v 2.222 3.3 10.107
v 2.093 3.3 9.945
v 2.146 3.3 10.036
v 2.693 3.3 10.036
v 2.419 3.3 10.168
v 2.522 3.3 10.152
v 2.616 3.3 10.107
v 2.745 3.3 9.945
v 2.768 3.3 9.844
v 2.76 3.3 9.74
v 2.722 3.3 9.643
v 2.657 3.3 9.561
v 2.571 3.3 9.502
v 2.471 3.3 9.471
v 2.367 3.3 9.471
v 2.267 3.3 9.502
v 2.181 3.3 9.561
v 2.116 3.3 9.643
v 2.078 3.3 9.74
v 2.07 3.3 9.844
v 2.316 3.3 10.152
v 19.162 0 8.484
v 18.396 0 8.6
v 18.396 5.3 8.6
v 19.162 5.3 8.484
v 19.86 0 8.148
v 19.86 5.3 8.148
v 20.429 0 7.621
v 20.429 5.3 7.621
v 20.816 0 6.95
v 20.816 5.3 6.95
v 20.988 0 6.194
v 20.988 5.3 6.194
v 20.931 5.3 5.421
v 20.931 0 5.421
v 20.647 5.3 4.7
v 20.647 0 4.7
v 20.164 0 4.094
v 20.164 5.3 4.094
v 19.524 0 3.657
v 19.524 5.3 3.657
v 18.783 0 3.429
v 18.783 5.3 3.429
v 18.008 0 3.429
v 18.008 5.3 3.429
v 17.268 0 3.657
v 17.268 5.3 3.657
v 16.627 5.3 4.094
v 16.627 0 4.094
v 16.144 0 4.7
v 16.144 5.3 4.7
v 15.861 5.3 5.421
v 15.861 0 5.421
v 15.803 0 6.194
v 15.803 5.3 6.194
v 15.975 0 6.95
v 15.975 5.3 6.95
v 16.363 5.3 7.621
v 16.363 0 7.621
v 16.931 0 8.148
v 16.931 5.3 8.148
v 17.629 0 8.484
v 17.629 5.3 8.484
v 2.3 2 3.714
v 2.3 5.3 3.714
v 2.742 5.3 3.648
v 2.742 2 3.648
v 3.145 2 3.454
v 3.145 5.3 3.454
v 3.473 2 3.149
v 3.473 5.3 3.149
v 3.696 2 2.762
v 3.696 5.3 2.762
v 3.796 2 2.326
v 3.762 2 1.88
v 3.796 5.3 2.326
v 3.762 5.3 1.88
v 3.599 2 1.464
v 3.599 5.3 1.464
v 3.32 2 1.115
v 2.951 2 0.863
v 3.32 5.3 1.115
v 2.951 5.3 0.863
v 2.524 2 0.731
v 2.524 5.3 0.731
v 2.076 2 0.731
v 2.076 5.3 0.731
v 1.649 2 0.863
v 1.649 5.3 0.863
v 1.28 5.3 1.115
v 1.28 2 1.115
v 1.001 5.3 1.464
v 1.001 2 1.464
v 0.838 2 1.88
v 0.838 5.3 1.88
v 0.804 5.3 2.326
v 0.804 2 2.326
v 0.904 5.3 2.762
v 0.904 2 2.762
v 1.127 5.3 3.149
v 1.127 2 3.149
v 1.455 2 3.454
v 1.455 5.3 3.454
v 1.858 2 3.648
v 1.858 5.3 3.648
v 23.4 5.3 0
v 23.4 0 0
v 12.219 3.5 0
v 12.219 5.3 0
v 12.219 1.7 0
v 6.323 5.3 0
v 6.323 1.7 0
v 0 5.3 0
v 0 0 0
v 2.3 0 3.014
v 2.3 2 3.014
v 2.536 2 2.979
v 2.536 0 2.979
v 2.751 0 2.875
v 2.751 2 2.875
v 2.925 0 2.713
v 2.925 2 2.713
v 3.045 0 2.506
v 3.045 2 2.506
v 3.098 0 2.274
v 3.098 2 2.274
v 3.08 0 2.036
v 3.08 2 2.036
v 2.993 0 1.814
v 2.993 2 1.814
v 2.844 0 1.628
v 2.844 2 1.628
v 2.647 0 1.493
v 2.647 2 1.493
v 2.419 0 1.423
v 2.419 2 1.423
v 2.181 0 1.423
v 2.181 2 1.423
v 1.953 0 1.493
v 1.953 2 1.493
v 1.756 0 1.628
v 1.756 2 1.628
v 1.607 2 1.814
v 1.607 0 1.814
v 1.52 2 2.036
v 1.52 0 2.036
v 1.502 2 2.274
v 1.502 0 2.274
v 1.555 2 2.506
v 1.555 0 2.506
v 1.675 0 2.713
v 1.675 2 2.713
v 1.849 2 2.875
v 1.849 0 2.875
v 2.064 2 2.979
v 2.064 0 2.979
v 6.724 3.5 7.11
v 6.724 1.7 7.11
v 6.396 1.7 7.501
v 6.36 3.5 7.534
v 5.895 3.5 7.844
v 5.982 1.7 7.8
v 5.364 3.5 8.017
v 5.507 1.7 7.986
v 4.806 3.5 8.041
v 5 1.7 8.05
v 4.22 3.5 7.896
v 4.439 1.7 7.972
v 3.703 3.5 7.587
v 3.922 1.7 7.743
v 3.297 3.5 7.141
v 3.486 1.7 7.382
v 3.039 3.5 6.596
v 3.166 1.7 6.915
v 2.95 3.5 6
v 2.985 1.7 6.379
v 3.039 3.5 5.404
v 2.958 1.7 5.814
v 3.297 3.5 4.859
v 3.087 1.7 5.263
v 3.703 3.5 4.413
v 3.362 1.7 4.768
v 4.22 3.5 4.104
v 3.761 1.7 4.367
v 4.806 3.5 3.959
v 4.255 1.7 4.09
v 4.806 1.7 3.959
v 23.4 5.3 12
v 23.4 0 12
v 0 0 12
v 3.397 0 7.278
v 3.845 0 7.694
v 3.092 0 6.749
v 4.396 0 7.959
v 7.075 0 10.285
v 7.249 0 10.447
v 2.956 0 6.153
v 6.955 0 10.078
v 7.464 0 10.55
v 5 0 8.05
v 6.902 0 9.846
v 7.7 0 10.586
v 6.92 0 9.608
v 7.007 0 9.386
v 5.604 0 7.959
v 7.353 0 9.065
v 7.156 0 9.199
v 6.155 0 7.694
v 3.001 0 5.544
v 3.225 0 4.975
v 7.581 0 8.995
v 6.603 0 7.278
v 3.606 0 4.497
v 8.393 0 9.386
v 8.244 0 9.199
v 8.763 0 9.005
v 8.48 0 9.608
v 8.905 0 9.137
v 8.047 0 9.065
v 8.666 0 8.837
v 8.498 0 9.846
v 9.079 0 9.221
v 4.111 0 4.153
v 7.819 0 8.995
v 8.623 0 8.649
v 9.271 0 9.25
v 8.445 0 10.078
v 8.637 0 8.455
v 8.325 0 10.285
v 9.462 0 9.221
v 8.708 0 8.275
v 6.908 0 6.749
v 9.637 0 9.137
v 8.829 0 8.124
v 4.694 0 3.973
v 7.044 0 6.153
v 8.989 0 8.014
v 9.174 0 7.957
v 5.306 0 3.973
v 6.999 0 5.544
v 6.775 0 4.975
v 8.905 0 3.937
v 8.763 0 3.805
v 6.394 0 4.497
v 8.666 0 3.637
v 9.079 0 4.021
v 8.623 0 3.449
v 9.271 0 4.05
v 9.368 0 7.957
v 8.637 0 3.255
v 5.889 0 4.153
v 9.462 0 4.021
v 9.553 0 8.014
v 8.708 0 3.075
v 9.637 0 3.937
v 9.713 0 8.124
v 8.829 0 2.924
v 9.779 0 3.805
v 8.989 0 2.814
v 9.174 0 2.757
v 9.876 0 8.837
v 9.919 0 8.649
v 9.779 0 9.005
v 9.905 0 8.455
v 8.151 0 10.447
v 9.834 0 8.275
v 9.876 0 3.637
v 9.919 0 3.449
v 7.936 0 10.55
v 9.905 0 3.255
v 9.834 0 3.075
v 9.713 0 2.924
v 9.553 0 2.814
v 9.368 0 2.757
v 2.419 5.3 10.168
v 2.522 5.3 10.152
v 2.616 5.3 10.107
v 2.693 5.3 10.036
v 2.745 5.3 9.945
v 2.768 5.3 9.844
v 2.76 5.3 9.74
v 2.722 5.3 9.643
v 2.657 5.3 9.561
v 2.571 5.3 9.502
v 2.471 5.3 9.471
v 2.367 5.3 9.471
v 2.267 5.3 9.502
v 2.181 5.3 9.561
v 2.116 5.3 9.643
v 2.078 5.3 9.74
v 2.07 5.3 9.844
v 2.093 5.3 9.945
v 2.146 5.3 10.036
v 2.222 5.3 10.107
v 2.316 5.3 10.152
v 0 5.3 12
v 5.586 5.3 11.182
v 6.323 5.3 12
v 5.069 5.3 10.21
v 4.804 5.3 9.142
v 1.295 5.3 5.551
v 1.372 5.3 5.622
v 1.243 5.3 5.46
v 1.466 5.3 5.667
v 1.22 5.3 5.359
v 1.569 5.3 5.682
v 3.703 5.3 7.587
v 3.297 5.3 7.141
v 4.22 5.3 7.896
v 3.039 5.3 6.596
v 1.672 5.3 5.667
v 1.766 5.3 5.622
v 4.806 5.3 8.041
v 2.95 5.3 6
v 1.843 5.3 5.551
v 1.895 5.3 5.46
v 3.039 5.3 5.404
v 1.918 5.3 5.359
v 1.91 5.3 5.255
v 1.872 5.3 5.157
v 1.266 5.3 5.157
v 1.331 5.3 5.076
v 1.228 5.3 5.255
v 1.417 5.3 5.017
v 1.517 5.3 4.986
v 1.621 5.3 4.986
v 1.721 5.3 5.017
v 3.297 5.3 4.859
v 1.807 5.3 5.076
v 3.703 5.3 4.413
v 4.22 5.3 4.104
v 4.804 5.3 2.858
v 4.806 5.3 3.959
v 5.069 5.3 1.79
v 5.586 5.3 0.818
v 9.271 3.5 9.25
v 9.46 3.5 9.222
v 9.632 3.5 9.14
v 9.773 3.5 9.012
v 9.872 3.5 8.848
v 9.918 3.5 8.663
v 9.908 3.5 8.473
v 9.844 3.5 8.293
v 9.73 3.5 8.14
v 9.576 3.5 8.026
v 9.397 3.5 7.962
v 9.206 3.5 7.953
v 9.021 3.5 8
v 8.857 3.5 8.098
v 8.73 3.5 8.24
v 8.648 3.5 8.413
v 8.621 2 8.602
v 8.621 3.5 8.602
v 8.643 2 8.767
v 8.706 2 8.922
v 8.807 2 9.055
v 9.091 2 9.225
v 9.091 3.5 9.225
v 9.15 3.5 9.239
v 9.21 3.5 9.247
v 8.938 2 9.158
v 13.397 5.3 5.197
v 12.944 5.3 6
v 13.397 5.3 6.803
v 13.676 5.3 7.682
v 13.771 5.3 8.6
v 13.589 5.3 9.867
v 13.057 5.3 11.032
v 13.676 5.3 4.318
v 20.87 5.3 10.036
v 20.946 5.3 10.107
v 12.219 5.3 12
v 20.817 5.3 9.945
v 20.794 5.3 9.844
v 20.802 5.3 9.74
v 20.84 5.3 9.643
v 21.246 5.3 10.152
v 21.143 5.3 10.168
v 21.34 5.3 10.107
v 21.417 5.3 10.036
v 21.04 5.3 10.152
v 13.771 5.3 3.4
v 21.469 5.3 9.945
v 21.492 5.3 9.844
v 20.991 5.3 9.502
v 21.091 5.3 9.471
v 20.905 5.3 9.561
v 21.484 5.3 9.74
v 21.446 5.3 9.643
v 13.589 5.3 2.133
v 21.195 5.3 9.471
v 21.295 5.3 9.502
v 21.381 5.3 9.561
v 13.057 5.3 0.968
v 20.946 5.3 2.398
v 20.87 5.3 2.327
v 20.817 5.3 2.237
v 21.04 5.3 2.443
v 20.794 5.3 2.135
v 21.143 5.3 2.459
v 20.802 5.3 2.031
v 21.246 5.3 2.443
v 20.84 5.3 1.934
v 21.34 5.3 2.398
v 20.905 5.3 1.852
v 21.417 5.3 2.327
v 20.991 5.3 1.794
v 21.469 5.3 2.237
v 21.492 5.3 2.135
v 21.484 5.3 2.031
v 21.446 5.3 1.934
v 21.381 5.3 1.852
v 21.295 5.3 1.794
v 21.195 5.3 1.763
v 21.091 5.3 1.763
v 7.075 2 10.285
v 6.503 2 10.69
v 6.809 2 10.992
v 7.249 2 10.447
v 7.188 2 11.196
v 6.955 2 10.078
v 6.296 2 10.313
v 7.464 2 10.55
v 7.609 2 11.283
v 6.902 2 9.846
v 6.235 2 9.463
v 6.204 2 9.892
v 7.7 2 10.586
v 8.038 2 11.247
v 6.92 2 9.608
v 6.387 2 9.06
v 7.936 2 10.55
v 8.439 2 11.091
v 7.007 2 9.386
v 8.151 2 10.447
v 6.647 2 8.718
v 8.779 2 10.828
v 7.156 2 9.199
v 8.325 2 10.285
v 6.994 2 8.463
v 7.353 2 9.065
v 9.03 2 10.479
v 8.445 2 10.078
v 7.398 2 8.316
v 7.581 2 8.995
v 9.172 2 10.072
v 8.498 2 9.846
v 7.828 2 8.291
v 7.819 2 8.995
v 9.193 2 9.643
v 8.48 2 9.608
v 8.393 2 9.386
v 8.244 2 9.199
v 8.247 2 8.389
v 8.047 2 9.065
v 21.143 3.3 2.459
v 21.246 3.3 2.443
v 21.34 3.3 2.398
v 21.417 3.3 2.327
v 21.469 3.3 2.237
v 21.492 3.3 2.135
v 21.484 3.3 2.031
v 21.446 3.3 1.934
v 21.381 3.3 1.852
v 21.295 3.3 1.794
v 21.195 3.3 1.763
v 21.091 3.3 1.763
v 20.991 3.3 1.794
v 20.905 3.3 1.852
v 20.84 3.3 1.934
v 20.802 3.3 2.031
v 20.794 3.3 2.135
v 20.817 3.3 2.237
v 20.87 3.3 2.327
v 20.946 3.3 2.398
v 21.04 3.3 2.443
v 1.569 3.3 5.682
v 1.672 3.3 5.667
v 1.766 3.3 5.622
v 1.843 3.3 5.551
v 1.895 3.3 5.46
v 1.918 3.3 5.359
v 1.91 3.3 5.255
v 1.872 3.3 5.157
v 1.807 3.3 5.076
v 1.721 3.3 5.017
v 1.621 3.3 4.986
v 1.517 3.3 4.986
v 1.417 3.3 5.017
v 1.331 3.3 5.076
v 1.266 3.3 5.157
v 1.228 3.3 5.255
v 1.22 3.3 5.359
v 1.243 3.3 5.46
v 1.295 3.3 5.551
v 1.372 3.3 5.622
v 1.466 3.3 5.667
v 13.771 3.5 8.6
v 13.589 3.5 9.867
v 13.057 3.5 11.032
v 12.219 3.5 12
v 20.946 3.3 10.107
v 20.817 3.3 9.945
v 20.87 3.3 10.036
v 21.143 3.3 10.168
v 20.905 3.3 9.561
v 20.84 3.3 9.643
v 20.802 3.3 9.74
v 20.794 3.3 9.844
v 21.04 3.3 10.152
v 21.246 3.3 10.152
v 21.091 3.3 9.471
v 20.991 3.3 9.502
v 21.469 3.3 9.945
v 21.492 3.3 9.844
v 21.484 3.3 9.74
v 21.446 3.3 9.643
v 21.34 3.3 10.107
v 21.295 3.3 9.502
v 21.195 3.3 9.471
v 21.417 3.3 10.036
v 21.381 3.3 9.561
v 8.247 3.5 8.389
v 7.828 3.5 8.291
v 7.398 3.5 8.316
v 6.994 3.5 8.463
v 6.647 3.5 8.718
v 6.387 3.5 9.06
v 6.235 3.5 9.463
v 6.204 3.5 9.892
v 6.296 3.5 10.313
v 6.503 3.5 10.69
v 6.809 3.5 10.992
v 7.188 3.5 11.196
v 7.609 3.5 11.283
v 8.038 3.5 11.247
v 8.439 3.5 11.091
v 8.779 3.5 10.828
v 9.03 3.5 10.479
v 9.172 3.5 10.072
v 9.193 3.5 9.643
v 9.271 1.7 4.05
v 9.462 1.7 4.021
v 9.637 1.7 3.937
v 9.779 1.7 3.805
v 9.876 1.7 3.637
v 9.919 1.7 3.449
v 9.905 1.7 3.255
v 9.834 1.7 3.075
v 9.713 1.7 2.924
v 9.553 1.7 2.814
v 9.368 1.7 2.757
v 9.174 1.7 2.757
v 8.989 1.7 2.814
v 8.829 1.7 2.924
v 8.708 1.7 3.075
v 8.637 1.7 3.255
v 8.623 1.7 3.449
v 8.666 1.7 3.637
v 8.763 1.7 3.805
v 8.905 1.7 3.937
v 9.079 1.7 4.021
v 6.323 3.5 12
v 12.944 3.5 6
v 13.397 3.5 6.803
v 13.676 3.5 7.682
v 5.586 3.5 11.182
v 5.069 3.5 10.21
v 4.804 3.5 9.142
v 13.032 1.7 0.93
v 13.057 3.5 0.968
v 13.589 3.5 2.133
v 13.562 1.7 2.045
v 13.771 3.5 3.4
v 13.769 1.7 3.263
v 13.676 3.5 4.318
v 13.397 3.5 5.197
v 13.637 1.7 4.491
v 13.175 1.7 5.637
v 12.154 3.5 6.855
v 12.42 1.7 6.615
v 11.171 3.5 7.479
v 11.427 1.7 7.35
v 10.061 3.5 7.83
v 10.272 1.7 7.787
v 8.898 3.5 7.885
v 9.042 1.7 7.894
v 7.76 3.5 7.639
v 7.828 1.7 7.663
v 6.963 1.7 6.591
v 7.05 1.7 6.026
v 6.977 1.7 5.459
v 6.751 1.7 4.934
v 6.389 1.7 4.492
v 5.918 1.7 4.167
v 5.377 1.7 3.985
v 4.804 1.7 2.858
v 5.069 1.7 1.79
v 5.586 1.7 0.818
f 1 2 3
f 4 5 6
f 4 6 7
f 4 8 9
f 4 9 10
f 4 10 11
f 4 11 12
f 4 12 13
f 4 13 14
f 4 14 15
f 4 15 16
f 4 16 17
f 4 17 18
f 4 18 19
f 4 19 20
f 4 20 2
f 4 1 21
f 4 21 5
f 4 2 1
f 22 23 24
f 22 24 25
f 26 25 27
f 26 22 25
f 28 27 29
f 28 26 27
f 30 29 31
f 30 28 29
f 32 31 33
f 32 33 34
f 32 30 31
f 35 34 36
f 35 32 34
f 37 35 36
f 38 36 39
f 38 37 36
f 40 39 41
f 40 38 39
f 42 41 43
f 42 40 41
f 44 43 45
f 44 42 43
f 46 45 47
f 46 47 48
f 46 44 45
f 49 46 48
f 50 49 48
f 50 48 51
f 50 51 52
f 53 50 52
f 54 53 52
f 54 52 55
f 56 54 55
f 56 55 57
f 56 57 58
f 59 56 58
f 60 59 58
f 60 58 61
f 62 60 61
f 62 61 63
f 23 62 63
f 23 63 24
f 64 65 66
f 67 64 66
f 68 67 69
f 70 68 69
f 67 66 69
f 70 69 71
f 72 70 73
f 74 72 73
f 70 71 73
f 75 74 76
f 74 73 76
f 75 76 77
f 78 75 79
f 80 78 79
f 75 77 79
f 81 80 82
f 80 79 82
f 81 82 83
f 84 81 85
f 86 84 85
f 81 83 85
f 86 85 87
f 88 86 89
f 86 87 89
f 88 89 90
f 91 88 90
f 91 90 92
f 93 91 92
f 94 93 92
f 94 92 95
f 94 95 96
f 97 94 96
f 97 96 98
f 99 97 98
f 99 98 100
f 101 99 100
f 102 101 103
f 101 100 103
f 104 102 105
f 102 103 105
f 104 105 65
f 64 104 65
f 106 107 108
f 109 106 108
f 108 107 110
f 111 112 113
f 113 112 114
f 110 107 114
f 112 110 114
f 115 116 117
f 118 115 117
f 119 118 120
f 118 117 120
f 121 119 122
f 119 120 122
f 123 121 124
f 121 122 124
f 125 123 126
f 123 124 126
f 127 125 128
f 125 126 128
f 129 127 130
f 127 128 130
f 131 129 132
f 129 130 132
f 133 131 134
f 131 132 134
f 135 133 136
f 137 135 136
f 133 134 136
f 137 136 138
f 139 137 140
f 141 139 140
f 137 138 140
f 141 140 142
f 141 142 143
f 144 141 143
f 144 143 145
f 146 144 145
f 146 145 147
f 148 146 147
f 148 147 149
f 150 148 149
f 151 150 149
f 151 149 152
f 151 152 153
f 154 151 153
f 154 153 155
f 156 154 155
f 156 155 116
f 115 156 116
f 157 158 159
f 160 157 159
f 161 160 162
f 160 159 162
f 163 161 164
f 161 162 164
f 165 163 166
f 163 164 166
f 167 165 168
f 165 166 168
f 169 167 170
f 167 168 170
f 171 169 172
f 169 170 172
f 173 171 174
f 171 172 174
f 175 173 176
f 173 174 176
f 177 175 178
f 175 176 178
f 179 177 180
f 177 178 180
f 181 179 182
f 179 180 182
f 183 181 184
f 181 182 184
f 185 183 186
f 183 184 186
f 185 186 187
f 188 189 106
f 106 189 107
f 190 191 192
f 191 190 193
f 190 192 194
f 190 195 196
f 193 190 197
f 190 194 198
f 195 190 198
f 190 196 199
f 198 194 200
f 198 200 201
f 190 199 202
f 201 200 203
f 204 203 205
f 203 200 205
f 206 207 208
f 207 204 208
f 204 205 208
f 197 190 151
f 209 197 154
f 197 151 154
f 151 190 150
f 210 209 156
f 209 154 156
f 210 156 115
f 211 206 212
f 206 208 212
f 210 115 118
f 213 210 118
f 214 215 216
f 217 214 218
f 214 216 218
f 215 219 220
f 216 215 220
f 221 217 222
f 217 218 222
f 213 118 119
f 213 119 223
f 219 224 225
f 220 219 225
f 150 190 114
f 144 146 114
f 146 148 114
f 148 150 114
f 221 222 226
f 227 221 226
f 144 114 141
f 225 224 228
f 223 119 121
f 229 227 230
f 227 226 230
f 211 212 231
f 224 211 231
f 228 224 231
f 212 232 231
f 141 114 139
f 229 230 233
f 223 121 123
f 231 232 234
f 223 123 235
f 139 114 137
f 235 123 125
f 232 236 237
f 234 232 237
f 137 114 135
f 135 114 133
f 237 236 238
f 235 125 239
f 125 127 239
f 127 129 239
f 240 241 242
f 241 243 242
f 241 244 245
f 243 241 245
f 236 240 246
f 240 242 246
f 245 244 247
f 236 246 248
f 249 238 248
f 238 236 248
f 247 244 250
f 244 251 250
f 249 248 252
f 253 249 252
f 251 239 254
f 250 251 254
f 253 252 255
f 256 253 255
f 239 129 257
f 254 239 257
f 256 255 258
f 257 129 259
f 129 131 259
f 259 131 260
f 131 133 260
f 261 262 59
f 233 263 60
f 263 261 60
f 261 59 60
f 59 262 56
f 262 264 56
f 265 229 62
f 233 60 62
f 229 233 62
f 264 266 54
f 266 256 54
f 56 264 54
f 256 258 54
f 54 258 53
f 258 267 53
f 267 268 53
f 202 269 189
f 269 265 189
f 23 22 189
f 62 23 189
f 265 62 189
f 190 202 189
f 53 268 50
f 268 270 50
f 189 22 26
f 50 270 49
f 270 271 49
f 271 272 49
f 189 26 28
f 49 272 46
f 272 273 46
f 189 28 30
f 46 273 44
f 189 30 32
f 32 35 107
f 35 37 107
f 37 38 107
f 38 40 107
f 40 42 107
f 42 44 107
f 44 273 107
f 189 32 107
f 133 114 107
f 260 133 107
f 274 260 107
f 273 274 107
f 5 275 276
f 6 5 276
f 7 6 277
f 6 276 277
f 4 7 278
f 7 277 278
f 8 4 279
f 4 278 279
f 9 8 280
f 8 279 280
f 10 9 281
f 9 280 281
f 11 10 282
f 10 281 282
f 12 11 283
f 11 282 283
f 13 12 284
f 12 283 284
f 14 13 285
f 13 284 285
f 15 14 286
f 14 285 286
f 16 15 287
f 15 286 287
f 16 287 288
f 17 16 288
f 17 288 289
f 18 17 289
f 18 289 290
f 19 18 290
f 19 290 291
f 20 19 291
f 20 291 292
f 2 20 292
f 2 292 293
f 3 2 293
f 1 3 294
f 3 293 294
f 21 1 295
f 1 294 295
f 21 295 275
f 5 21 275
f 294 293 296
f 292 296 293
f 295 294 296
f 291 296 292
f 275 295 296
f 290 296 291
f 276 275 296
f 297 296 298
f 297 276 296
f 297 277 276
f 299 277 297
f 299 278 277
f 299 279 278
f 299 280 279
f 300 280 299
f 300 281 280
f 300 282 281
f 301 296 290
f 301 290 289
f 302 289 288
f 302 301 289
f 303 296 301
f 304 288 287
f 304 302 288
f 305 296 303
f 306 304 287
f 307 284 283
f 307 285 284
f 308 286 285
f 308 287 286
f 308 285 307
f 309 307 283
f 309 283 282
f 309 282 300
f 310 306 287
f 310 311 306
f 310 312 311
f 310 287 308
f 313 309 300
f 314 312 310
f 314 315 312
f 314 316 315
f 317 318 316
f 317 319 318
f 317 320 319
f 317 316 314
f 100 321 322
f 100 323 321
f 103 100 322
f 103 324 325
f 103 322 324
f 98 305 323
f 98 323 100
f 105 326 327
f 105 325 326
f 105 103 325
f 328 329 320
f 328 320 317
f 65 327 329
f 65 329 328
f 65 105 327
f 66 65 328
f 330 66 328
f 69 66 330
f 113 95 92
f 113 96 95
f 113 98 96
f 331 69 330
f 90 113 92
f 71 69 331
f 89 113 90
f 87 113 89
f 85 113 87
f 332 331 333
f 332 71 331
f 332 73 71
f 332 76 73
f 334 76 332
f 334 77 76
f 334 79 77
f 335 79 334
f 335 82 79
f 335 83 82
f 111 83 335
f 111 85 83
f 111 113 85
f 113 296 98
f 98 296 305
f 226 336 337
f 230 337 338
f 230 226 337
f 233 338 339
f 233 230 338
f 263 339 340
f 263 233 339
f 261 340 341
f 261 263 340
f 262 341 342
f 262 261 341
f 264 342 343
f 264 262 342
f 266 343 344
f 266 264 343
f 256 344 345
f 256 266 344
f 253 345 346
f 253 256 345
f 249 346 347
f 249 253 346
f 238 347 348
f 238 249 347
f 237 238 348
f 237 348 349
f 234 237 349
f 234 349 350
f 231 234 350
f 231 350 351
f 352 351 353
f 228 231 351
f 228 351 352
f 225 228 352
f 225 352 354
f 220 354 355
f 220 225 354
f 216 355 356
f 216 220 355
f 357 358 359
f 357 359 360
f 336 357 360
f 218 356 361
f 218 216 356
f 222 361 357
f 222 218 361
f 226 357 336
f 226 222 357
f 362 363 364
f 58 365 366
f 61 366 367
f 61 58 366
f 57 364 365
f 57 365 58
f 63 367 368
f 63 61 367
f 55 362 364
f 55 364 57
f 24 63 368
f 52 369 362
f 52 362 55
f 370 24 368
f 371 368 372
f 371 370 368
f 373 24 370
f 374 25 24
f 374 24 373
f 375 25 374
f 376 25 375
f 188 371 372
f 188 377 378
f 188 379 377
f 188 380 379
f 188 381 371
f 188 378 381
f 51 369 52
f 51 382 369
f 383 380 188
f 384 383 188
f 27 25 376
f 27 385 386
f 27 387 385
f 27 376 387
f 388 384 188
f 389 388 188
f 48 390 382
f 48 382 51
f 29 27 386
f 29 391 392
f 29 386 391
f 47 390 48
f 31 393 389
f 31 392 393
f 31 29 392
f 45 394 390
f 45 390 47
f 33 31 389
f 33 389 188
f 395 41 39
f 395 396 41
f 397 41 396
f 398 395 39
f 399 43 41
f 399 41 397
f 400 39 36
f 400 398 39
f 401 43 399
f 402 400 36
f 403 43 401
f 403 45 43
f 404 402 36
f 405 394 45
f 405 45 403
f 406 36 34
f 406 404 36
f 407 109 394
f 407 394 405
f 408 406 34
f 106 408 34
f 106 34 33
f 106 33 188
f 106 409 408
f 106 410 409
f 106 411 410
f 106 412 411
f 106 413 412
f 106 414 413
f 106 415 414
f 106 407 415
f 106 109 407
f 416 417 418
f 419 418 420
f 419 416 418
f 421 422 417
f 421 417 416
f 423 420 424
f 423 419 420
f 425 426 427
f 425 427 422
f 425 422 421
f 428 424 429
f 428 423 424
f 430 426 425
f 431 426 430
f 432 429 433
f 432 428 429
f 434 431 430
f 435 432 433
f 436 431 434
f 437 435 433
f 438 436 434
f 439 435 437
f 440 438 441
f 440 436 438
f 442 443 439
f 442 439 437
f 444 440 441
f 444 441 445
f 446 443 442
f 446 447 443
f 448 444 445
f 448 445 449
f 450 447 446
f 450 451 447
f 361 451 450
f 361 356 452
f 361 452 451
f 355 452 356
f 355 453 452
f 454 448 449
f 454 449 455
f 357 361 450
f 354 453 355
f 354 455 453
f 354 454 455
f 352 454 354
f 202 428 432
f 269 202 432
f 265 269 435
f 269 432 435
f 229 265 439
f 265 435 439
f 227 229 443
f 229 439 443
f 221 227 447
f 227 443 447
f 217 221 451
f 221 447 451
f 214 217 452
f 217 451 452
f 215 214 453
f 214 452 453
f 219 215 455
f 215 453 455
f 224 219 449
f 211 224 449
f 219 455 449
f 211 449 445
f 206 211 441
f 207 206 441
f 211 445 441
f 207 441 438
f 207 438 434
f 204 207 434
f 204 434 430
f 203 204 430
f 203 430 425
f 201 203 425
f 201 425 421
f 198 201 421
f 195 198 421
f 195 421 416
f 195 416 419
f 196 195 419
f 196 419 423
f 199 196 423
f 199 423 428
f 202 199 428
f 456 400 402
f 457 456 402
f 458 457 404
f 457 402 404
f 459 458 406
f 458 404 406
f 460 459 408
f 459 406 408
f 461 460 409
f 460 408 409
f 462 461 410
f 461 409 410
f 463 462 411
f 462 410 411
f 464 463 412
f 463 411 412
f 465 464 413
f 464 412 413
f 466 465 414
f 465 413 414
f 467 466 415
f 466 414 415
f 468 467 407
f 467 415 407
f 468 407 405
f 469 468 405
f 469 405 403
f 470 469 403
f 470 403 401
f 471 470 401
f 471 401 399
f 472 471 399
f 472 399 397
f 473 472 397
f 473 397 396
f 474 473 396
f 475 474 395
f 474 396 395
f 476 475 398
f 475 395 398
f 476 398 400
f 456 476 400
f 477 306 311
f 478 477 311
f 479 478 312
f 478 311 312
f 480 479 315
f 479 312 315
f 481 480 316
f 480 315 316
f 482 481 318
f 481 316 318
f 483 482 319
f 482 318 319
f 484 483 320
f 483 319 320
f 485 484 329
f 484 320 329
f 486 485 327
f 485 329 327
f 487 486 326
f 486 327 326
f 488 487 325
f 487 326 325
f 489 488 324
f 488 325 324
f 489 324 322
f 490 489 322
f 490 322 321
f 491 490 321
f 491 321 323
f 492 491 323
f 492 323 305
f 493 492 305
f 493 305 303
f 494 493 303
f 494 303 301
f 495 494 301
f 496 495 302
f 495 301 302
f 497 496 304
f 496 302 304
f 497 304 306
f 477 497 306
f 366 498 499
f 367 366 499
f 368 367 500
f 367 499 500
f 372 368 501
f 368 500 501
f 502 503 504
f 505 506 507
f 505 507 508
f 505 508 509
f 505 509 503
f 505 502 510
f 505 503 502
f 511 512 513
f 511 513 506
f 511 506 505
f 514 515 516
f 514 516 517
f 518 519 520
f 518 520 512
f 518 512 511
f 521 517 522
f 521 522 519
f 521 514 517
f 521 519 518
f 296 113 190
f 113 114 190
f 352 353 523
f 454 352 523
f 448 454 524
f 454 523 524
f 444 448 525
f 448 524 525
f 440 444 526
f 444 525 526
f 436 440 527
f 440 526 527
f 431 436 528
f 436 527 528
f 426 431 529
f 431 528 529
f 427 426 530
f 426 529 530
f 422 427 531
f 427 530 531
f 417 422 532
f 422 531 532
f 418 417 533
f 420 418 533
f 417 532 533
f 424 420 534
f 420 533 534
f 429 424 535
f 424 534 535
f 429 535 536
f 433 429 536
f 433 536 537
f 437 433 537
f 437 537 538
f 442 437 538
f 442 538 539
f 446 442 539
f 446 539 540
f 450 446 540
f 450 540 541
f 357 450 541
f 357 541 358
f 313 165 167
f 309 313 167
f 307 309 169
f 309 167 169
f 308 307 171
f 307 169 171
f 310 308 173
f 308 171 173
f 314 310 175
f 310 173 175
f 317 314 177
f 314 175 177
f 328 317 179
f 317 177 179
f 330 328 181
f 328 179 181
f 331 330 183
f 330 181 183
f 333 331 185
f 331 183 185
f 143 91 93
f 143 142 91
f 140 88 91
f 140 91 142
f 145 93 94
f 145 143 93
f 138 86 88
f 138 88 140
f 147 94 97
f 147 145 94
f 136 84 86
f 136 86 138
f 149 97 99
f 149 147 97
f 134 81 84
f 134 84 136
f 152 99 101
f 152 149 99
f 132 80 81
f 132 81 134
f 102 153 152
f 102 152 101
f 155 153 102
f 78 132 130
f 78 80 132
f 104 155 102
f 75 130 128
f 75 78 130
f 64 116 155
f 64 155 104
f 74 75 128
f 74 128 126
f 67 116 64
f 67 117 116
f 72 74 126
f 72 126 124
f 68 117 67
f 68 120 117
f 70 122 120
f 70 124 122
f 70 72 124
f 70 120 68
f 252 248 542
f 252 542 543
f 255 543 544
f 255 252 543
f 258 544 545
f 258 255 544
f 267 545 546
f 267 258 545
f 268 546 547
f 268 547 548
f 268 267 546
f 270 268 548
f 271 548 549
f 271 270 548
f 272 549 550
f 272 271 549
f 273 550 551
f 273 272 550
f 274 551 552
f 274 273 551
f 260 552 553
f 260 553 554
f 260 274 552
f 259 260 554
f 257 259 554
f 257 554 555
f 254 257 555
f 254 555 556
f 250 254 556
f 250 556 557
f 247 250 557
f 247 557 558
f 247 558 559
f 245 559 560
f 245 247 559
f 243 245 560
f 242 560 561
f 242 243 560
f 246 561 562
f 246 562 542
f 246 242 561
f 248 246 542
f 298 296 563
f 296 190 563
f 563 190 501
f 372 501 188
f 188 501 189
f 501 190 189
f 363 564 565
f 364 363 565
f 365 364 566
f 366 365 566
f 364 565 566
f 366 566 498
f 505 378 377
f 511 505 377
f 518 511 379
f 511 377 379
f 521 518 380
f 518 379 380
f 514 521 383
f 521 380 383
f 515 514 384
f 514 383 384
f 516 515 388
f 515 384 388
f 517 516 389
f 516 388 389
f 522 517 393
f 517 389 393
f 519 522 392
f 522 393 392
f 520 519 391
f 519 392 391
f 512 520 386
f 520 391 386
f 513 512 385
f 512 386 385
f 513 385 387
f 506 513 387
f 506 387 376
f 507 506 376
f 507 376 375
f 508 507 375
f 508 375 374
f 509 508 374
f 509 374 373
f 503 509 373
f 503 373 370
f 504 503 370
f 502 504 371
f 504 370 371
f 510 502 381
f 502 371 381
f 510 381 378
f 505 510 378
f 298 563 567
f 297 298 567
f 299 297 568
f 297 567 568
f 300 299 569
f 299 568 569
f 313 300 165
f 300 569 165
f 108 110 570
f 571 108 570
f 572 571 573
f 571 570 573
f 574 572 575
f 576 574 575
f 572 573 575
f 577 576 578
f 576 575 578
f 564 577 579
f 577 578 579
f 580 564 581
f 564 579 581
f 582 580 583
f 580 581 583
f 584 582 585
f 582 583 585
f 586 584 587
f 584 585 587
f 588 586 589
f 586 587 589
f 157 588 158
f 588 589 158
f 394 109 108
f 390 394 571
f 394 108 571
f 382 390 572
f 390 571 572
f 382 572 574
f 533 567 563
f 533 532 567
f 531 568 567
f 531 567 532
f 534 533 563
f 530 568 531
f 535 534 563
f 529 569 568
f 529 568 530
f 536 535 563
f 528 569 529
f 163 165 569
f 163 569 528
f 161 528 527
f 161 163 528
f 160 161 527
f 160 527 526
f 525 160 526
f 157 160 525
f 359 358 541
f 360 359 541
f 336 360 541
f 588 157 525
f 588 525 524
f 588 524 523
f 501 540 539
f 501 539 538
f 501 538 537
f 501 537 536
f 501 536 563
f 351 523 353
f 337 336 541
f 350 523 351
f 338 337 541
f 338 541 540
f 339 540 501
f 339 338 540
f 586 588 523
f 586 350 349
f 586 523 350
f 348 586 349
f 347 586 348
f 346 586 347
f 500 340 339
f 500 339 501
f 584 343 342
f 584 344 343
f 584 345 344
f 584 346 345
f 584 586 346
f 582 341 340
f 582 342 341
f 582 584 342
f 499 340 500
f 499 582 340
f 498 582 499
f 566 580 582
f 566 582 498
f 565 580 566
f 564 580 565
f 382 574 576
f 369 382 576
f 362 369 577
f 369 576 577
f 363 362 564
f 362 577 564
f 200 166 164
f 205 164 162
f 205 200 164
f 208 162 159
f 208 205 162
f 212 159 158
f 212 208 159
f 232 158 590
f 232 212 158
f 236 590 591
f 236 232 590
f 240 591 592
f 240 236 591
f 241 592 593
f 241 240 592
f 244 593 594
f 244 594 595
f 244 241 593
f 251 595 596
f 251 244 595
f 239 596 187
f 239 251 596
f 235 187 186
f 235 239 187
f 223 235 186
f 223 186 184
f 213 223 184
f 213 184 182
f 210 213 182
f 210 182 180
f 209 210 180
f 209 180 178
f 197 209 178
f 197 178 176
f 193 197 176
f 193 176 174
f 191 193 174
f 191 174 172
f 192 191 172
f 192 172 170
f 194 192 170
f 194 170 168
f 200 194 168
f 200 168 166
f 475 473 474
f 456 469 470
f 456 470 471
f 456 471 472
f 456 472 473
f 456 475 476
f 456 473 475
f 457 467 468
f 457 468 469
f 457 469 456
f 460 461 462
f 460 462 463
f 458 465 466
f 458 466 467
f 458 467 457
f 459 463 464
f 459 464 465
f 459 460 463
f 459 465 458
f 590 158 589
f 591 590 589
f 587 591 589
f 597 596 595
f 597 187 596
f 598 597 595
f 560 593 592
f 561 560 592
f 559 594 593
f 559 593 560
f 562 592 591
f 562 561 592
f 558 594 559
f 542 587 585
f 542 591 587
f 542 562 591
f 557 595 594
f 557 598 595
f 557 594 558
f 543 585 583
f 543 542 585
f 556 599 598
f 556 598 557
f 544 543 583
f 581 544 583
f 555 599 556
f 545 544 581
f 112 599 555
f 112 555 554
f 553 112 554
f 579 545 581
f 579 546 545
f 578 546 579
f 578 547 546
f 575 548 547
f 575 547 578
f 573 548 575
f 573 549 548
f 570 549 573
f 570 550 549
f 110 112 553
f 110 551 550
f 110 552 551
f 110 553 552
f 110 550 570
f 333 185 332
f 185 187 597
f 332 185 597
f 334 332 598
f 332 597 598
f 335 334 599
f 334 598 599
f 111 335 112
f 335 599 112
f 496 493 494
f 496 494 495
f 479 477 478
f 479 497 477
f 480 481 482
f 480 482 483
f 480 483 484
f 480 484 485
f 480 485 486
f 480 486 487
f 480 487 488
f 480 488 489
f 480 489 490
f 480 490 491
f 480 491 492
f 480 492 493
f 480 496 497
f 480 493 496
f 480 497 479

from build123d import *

# Parameters (mm, degrees)
SKETCH_1_W          = 23.4
SKETCH_1_H          = 12
SKETCH_1_R          = 2.05
SKETCH_1_R_2        = 0.65
SKETCH_1_R_3        = 2.6
EXTRUDE_1_DEPTH     = 1.7
SKETCH_3_R          = 0.65
SKETCH_3_R_2        = 2.6
EXTRUDE_3_DEPTH     = 1.8
EXTRUDE_START       = 1.8
SKETCH_3_16_R       = 2.6
EXTRUDE_4_DEPTH     = 1.8
CUT_EXTRUDE_START   = 5.3
SKETCH_5_R          = 0.8
CUT_EXTRUDE_1_DEPTH = 33.126293072
SKETCH_5_10_R       = 1.5
CUT_EXTRUDE_3_DEPTH = 3.3
SKETCH_7_R          = 0.35
CUT_EXTRUDE_4_DEPTH = 2


with BuildPart() as part:
    # 草图1 → 凸台-拉伸1 (new body)
    with BuildSketch(Plane(origin=(0, 0, 0), x_dir=(1, 0, 0), z_dir=(0, 1, 0))):
        with Locations((11.7, -6)):
            Rectangle(SKETCH_1_W, SKETCH_1_H)
        with Locations(Location((5, -6, 0), (0, 0, 270))):
            Circle(SKETCH_1_R, mode=Mode.SUBTRACT)
        with Locations(Location((9.270831301, -8.6, 0), (0, 0, 270))):
            Circle(SKETCH_1_R_2, mode=Mode.SUBTRACT)
        with Locations(Location((18.395740059, -6, 0), (0, 0, 270))):
            Circle(SKETCH_1_R_3, mode=Mode.SUBTRACT)
        with Locations(Location((9.270831301, -3.4, 0), (0, 0, 270))):
            Circle(SKETCH_1_R_2, mode=Mode.SUBTRACT)
    extrude(amount=EXTRUDE_1_DEPTH)

    # 草图3 → 凸台-拉伸3 (add)
    with BuildSketch(Plane(origin=(0, 1.7, 0), x_dir=(1, 0, 0), z_dir=(0, 1, 0))):
        with BuildLine():
            Line((6.322950706, 0), (0, 0))
            Line((0, 0), (0, -12))
            Line((0, -12), (23.4, -12))
            Line((23.4, -12), (23.4, 0))
            Line((23.4, 0), (12.218711895, 0))
            ThreePointArc((12.218711895, 0), (12.831329536, -6.151881595), (6.723669831, -7.109712717))
            ThreePointArc((6.723669831, -7.109712717), (3.248959167, -7.066), (4.805714858, -3.959227283))
            ThreePointArc((4.805714858, -3.959227283), (5.068807808, -1.789720968), (6.322950706, 0))
        make_face()
        with Locations(Location((9.270831301, -8.6, 0), (0, 0, 270))):
            Circle(SKETCH_3_R, mode=Mode.SUBTRACT)
        with Locations(Location((18.395740059, -6, 0), (0, 0, 270))):
            Circle(SKETCH_3_R_2, mode=Mode.SUBTRACT)
    extrude(amount=EXTRUDE_3_DEPTH)

    # 草图3<16> → 凸台-拉伸4 (add)
    # profile 1 of 2: a face of its own
    with BuildSketch(Plane(origin=(0, 1.7, 0), x_dir=(1, 0, 0), z_dir=(0, 1, 0)).offset(EXTRUDE_START)):
        with BuildLine():
            Line((6.322950706, 0), (0, 0))
            Line((0, 0), (0, -12))
            Line((0, -12), (6.322950706, -12))
            ThreePointArc((6.322950706, -12), (5.068807808, -10.210279032), (4.805714858, -8.040772717))
            ThreePointArc((4.805714858, -8.040772717), (2.95, -6), (4.805714858, -3.959227283))
            ThreePointArc((4.805714858, -3.959227283), (5.068807808, -1.789720968), (6.322950706, 0))
        make_face()
    # profile 2 of 2: a face of its own
    with BuildSketch(Plane(origin=(0, 1.7, 0), x_dir=(1, 0, 0), z_dir=(0, 1, 0)).offset(EXTRUDE_START)):
        with BuildLine():
            Line((23.4, 0), (12.218711895, 0))
            ThreePointArc((12.218711895, 0), (13.364452111, -1.531238736), (13.770831301, -3.4))
            ThreePointArc((13.770831301, -3.4), (13.559067005, -4.7641974), (12.943704835, -6))
            ThreePointArc((12.943704835, -6), (13.559067005, -7.2358026), (13.770831301, -8.6))
            ThreePointArc((13.770831301, -8.6), (13.364452111, -10.468761264), (12.218711895, -12))
            Line((12.218711895, -12), (23.4, -12))
            Line((23.4, -12), (23.4, 0))
        make_face()
        with Locations(Location((18.395740059, -6, 0), (0, 0, 270))):
            Circle(SKETCH_3_16_R, mode=Mode.SUBTRACT)
    extrude(amount=EXTRUDE_4_DEPTH)

    # 草图5 → 切除-拉伸1 (cut, through all)
    with BuildSketch(Plane(origin=(0, 0, 0), x_dir=(1, 0, 0), z_dir=(0, 1, 0)).offset(CUT_EXTRUDE_START)):
        with Locations(Location((2.3, -2.214171161, 0), (0, 0, 270))):
            Circle(SKETCH_5_R)
        with Locations(Location((7.7, -9.785828839, 0), (0, 0, 270))):
            Circle(SKETCH_5_R)
    extrude(amount=-CUT_EXTRUDE_1_DEPTH, mode=Mode.SUBTRACT)

    # 草图5<10> → 切除-拉伸3 (cut)
    with BuildSketch(Plane(origin=(0, 0, 0), x_dir=(1, 0, 0), z_dir=(0, 1, 0)).offset(CUT_EXTRUDE_START)):
        with Locations(Location((2.3, -2.214171161, 0), (0, 0, 270))):
            Circle(SKETCH_5_10_R)
        with Locations((7.7, -9.785828839)):
            Circle(SKETCH_5_10_R)
    extrude(amount=-CUT_EXTRUDE_3_DEPTH, mode=Mode.SUBTRACT)

    # 草图7 → 切除-拉伸4 (cut)
    with BuildSketch(Plane(origin=(0, 5.3, 0), x_dir=(1, 0, 0), z_dir=(0, 1, 0))):
        with Locations(Location((1.568943185, -5.332489754, 0), (0, 0, 270))):
            Circle(SKETCH_7_R)
        with Locations(Location((2.419185522, -9.817518082, 0), (0, 0, 270))):
            Circle(SKETCH_7_R)
        with Locations(Location((21.143175994, -2.108925173, 0), (0, 0, 270))):
            Circle(SKETCH_7_R)
        with Locations(Location((21.143175994, -9.817518082, 0), (0, 0, 270))):
            Circle(SKETCH_7_R)
    extrude(amount=-CUT_EXTRUDE_4_DEPTH, mode=Mode.SUBTRACT)


solid = part.part
